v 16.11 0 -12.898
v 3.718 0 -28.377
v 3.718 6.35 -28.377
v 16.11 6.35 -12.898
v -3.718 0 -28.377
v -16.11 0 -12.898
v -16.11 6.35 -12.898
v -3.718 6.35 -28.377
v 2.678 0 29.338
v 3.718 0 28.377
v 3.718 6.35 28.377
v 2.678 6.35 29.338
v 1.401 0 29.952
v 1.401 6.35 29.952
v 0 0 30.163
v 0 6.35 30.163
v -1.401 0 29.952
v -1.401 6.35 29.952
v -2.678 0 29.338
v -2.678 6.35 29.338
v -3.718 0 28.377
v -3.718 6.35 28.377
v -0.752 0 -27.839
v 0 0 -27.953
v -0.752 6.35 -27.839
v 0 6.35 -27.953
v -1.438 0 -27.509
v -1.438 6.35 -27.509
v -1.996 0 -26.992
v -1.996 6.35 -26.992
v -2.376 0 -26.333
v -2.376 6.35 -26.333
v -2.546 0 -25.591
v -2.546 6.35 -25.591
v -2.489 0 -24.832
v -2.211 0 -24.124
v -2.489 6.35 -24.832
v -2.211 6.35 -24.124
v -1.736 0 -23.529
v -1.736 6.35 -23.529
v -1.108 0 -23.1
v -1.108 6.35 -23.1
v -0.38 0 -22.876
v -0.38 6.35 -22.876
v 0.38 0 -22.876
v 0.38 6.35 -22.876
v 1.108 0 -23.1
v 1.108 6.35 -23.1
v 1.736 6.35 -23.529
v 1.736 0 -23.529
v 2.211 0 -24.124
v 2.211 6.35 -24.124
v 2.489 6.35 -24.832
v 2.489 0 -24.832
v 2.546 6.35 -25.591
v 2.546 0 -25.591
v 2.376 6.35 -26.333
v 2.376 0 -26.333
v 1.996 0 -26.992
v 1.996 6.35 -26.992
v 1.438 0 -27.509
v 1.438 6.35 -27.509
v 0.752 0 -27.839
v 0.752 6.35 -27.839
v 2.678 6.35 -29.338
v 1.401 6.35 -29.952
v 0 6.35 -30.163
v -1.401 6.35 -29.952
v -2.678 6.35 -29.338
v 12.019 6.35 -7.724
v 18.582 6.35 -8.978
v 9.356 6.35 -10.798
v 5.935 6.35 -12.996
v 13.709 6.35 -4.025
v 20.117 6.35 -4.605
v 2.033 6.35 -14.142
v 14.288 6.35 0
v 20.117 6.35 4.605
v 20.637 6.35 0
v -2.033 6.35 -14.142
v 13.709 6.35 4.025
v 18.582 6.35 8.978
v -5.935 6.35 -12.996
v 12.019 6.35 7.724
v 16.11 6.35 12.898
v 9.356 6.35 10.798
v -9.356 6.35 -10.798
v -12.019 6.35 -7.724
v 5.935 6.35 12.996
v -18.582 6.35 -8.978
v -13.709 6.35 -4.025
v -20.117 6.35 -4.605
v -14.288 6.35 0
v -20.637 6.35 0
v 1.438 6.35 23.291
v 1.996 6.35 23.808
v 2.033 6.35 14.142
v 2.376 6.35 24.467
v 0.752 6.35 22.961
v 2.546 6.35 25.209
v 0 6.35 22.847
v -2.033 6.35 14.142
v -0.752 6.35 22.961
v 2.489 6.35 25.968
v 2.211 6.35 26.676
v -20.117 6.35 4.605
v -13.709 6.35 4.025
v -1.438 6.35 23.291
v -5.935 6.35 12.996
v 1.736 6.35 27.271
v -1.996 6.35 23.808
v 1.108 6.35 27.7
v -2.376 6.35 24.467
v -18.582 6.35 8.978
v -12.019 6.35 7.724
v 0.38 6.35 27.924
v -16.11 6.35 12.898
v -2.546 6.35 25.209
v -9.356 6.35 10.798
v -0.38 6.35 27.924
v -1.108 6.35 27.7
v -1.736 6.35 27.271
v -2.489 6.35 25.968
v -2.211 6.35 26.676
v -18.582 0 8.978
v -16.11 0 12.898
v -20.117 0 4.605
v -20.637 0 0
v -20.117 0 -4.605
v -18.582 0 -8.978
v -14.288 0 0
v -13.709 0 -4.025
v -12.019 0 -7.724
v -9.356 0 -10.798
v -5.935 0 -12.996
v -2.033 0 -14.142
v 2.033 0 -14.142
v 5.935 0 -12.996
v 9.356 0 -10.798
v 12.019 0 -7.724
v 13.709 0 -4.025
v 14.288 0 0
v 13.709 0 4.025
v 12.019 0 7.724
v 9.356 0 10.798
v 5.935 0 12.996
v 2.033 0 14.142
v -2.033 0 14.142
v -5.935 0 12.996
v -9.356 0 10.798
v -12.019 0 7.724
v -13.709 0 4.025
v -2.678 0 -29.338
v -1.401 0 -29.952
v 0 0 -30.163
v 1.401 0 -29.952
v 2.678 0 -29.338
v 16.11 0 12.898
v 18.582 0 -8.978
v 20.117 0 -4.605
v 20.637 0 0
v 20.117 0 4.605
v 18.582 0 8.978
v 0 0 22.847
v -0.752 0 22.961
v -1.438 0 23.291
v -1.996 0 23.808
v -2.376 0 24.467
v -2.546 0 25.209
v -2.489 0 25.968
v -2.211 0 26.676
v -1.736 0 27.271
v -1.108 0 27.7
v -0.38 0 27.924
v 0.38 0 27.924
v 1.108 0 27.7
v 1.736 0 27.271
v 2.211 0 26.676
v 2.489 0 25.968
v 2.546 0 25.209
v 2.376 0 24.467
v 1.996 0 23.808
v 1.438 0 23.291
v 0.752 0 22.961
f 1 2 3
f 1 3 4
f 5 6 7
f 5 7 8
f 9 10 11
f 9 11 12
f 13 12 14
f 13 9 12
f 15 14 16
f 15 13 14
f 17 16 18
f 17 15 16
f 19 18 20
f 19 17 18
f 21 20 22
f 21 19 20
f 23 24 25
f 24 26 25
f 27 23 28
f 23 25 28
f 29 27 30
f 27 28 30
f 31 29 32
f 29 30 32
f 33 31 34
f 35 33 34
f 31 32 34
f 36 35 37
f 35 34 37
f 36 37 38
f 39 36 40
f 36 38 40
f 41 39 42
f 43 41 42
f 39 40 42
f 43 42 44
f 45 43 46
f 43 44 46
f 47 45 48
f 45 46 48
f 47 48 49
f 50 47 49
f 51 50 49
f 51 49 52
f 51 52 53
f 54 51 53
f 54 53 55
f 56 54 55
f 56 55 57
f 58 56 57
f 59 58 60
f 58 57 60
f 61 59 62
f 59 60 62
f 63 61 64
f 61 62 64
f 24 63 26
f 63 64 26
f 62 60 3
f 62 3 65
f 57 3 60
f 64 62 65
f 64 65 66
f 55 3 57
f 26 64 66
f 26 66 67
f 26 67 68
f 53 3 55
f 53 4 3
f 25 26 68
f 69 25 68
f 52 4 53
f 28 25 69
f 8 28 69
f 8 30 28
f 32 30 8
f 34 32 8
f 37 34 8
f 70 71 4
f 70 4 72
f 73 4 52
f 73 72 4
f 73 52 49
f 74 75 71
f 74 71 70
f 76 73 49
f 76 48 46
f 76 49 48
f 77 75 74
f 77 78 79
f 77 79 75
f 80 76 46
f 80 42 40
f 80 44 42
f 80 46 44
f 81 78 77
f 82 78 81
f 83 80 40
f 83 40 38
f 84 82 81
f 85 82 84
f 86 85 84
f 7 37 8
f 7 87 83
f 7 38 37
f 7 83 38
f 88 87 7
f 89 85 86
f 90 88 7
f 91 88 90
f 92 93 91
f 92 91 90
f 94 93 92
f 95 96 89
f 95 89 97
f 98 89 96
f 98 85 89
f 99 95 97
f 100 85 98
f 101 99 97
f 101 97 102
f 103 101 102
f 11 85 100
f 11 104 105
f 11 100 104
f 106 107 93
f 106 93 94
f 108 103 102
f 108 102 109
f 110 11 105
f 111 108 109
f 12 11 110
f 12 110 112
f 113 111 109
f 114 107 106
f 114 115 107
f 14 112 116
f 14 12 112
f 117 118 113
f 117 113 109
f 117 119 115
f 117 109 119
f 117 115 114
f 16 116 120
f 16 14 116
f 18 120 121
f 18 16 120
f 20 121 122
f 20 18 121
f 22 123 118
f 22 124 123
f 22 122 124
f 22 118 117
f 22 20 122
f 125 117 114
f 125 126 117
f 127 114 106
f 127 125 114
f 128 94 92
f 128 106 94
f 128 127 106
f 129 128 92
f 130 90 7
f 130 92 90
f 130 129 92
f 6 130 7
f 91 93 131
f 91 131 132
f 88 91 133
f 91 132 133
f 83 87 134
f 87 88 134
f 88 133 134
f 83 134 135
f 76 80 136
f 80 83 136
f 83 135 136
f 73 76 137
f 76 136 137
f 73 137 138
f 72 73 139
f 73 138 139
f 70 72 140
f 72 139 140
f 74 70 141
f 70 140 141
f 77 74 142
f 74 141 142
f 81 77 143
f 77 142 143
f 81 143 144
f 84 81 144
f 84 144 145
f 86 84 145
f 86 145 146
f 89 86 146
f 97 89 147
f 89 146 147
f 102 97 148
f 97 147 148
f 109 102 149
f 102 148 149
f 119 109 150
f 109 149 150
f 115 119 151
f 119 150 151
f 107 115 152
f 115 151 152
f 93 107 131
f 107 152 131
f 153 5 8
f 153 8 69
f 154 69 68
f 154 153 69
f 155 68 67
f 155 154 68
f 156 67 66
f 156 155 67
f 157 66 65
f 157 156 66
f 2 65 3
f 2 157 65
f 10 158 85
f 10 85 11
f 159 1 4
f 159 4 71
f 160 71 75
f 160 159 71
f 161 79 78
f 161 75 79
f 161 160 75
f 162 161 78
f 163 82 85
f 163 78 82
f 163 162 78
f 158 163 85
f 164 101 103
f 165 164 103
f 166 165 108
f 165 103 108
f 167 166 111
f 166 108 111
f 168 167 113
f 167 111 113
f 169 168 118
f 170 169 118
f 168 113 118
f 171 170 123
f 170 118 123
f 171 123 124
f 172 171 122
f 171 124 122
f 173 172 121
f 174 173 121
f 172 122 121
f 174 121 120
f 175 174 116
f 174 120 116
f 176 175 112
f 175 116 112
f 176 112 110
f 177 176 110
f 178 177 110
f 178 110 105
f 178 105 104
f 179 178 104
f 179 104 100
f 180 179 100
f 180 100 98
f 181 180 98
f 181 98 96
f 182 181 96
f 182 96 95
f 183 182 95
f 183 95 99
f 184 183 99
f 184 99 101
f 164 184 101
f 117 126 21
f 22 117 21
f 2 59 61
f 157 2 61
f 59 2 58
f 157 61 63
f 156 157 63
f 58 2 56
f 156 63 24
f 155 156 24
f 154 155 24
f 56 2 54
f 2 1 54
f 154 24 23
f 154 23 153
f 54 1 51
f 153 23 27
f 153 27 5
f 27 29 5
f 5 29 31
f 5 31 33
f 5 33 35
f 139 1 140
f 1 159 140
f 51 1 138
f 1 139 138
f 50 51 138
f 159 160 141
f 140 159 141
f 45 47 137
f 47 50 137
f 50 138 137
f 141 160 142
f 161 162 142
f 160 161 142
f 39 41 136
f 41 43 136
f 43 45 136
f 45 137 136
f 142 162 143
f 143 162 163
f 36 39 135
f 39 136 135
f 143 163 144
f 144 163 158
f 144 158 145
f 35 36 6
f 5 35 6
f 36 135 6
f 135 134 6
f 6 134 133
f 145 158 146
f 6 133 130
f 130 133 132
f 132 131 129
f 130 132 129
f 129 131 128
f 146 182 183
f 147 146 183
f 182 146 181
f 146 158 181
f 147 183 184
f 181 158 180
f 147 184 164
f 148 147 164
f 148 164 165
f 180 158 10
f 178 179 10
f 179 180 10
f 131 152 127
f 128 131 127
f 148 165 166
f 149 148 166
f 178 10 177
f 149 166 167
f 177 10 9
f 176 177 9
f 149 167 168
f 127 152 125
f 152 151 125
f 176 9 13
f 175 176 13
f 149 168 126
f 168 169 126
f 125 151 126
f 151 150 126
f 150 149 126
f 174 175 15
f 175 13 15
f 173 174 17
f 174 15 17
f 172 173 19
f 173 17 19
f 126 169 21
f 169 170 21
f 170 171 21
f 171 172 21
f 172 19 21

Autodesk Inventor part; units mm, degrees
ref_plane "YZ Plane" through (0, 0, 0) normal (1, 0, 0) x (0, 1, 0)
ref_plane "XZ Plane" through (0, 0, 0) normal (0, 1, 0) x (-1, 0, 0)
ref_plane "XY Plane" through (0, 0, 0) normal (0, 0, 1) x (1, 0, 0)
sketch "Sketch1" plane through (0, 0, 0) normal (0, 1, 0) x (-1, 0, 0)
  circle A0 centre (0, 0) radius 14.2875
  line L0 (0, 25.4) -> (0, -25.4) construction
  circle A1 centre (0, 0) radius 18.1864 construction
  circle A2 centre (0, 25.4) radius 4.7625 construction
  circle A3 centre (0, -25.4) radius 4.7625 construction
  circle A4 centre (0, 0) radius 20.6375 construction
  line L1 (16.1101, 12.8984) -> (3.7177, 28.3766)
  line L2 (16.1101, -12.8984) -> (3.7177, -28.3766)
  line L3 (-3.7177, -28.3766) -> (-16.1101, -12.8984)
  line L4 (-16.1101, 12.8984) -> (-3.7177, 28.3766)
  arc A5 (3.7177, 28.3766) -> (-3.7177, 28.3766) centre (0, 25.4) ccw
  arc A6 (-16.1101, 12.8984) -> (-16.1101, -12.8984) centre (0, 0) ccw
  arc A7 (16.1101, -12.8984) -> (16.1101, 12.8984) centre (0, 0) ccw
  arc A8 (-3.7177, -28.3766) -> (3.7177, -28.3766) centre (0, -25.4) ccw
  point P0 (-3.7177, 28.3766)
  point P1 (3.7177, -28.3766)
  dimension "d0" = 28.575
  dimension "d1" = 50.8
  dimension "d2" = 36.3728
  dimension "d3" = 9.525
  dimension "d4" = 9.525
  dimension "d5" = 6.35
extrude "Extrusion1" add sketch "Sketch1" along normal blind 6.35
hole "Hole1" at (0, 0, 25.4) at (0, 0, -25.4) direction (0, 1, 0) diameter 5.1054 end through all clearance for "Flat Head Machine Screw (82)" size "#10" standard "Ansi Unified Screw Threads"
properties part number "EL2-CGB-005" material "Aluminum 6061"
